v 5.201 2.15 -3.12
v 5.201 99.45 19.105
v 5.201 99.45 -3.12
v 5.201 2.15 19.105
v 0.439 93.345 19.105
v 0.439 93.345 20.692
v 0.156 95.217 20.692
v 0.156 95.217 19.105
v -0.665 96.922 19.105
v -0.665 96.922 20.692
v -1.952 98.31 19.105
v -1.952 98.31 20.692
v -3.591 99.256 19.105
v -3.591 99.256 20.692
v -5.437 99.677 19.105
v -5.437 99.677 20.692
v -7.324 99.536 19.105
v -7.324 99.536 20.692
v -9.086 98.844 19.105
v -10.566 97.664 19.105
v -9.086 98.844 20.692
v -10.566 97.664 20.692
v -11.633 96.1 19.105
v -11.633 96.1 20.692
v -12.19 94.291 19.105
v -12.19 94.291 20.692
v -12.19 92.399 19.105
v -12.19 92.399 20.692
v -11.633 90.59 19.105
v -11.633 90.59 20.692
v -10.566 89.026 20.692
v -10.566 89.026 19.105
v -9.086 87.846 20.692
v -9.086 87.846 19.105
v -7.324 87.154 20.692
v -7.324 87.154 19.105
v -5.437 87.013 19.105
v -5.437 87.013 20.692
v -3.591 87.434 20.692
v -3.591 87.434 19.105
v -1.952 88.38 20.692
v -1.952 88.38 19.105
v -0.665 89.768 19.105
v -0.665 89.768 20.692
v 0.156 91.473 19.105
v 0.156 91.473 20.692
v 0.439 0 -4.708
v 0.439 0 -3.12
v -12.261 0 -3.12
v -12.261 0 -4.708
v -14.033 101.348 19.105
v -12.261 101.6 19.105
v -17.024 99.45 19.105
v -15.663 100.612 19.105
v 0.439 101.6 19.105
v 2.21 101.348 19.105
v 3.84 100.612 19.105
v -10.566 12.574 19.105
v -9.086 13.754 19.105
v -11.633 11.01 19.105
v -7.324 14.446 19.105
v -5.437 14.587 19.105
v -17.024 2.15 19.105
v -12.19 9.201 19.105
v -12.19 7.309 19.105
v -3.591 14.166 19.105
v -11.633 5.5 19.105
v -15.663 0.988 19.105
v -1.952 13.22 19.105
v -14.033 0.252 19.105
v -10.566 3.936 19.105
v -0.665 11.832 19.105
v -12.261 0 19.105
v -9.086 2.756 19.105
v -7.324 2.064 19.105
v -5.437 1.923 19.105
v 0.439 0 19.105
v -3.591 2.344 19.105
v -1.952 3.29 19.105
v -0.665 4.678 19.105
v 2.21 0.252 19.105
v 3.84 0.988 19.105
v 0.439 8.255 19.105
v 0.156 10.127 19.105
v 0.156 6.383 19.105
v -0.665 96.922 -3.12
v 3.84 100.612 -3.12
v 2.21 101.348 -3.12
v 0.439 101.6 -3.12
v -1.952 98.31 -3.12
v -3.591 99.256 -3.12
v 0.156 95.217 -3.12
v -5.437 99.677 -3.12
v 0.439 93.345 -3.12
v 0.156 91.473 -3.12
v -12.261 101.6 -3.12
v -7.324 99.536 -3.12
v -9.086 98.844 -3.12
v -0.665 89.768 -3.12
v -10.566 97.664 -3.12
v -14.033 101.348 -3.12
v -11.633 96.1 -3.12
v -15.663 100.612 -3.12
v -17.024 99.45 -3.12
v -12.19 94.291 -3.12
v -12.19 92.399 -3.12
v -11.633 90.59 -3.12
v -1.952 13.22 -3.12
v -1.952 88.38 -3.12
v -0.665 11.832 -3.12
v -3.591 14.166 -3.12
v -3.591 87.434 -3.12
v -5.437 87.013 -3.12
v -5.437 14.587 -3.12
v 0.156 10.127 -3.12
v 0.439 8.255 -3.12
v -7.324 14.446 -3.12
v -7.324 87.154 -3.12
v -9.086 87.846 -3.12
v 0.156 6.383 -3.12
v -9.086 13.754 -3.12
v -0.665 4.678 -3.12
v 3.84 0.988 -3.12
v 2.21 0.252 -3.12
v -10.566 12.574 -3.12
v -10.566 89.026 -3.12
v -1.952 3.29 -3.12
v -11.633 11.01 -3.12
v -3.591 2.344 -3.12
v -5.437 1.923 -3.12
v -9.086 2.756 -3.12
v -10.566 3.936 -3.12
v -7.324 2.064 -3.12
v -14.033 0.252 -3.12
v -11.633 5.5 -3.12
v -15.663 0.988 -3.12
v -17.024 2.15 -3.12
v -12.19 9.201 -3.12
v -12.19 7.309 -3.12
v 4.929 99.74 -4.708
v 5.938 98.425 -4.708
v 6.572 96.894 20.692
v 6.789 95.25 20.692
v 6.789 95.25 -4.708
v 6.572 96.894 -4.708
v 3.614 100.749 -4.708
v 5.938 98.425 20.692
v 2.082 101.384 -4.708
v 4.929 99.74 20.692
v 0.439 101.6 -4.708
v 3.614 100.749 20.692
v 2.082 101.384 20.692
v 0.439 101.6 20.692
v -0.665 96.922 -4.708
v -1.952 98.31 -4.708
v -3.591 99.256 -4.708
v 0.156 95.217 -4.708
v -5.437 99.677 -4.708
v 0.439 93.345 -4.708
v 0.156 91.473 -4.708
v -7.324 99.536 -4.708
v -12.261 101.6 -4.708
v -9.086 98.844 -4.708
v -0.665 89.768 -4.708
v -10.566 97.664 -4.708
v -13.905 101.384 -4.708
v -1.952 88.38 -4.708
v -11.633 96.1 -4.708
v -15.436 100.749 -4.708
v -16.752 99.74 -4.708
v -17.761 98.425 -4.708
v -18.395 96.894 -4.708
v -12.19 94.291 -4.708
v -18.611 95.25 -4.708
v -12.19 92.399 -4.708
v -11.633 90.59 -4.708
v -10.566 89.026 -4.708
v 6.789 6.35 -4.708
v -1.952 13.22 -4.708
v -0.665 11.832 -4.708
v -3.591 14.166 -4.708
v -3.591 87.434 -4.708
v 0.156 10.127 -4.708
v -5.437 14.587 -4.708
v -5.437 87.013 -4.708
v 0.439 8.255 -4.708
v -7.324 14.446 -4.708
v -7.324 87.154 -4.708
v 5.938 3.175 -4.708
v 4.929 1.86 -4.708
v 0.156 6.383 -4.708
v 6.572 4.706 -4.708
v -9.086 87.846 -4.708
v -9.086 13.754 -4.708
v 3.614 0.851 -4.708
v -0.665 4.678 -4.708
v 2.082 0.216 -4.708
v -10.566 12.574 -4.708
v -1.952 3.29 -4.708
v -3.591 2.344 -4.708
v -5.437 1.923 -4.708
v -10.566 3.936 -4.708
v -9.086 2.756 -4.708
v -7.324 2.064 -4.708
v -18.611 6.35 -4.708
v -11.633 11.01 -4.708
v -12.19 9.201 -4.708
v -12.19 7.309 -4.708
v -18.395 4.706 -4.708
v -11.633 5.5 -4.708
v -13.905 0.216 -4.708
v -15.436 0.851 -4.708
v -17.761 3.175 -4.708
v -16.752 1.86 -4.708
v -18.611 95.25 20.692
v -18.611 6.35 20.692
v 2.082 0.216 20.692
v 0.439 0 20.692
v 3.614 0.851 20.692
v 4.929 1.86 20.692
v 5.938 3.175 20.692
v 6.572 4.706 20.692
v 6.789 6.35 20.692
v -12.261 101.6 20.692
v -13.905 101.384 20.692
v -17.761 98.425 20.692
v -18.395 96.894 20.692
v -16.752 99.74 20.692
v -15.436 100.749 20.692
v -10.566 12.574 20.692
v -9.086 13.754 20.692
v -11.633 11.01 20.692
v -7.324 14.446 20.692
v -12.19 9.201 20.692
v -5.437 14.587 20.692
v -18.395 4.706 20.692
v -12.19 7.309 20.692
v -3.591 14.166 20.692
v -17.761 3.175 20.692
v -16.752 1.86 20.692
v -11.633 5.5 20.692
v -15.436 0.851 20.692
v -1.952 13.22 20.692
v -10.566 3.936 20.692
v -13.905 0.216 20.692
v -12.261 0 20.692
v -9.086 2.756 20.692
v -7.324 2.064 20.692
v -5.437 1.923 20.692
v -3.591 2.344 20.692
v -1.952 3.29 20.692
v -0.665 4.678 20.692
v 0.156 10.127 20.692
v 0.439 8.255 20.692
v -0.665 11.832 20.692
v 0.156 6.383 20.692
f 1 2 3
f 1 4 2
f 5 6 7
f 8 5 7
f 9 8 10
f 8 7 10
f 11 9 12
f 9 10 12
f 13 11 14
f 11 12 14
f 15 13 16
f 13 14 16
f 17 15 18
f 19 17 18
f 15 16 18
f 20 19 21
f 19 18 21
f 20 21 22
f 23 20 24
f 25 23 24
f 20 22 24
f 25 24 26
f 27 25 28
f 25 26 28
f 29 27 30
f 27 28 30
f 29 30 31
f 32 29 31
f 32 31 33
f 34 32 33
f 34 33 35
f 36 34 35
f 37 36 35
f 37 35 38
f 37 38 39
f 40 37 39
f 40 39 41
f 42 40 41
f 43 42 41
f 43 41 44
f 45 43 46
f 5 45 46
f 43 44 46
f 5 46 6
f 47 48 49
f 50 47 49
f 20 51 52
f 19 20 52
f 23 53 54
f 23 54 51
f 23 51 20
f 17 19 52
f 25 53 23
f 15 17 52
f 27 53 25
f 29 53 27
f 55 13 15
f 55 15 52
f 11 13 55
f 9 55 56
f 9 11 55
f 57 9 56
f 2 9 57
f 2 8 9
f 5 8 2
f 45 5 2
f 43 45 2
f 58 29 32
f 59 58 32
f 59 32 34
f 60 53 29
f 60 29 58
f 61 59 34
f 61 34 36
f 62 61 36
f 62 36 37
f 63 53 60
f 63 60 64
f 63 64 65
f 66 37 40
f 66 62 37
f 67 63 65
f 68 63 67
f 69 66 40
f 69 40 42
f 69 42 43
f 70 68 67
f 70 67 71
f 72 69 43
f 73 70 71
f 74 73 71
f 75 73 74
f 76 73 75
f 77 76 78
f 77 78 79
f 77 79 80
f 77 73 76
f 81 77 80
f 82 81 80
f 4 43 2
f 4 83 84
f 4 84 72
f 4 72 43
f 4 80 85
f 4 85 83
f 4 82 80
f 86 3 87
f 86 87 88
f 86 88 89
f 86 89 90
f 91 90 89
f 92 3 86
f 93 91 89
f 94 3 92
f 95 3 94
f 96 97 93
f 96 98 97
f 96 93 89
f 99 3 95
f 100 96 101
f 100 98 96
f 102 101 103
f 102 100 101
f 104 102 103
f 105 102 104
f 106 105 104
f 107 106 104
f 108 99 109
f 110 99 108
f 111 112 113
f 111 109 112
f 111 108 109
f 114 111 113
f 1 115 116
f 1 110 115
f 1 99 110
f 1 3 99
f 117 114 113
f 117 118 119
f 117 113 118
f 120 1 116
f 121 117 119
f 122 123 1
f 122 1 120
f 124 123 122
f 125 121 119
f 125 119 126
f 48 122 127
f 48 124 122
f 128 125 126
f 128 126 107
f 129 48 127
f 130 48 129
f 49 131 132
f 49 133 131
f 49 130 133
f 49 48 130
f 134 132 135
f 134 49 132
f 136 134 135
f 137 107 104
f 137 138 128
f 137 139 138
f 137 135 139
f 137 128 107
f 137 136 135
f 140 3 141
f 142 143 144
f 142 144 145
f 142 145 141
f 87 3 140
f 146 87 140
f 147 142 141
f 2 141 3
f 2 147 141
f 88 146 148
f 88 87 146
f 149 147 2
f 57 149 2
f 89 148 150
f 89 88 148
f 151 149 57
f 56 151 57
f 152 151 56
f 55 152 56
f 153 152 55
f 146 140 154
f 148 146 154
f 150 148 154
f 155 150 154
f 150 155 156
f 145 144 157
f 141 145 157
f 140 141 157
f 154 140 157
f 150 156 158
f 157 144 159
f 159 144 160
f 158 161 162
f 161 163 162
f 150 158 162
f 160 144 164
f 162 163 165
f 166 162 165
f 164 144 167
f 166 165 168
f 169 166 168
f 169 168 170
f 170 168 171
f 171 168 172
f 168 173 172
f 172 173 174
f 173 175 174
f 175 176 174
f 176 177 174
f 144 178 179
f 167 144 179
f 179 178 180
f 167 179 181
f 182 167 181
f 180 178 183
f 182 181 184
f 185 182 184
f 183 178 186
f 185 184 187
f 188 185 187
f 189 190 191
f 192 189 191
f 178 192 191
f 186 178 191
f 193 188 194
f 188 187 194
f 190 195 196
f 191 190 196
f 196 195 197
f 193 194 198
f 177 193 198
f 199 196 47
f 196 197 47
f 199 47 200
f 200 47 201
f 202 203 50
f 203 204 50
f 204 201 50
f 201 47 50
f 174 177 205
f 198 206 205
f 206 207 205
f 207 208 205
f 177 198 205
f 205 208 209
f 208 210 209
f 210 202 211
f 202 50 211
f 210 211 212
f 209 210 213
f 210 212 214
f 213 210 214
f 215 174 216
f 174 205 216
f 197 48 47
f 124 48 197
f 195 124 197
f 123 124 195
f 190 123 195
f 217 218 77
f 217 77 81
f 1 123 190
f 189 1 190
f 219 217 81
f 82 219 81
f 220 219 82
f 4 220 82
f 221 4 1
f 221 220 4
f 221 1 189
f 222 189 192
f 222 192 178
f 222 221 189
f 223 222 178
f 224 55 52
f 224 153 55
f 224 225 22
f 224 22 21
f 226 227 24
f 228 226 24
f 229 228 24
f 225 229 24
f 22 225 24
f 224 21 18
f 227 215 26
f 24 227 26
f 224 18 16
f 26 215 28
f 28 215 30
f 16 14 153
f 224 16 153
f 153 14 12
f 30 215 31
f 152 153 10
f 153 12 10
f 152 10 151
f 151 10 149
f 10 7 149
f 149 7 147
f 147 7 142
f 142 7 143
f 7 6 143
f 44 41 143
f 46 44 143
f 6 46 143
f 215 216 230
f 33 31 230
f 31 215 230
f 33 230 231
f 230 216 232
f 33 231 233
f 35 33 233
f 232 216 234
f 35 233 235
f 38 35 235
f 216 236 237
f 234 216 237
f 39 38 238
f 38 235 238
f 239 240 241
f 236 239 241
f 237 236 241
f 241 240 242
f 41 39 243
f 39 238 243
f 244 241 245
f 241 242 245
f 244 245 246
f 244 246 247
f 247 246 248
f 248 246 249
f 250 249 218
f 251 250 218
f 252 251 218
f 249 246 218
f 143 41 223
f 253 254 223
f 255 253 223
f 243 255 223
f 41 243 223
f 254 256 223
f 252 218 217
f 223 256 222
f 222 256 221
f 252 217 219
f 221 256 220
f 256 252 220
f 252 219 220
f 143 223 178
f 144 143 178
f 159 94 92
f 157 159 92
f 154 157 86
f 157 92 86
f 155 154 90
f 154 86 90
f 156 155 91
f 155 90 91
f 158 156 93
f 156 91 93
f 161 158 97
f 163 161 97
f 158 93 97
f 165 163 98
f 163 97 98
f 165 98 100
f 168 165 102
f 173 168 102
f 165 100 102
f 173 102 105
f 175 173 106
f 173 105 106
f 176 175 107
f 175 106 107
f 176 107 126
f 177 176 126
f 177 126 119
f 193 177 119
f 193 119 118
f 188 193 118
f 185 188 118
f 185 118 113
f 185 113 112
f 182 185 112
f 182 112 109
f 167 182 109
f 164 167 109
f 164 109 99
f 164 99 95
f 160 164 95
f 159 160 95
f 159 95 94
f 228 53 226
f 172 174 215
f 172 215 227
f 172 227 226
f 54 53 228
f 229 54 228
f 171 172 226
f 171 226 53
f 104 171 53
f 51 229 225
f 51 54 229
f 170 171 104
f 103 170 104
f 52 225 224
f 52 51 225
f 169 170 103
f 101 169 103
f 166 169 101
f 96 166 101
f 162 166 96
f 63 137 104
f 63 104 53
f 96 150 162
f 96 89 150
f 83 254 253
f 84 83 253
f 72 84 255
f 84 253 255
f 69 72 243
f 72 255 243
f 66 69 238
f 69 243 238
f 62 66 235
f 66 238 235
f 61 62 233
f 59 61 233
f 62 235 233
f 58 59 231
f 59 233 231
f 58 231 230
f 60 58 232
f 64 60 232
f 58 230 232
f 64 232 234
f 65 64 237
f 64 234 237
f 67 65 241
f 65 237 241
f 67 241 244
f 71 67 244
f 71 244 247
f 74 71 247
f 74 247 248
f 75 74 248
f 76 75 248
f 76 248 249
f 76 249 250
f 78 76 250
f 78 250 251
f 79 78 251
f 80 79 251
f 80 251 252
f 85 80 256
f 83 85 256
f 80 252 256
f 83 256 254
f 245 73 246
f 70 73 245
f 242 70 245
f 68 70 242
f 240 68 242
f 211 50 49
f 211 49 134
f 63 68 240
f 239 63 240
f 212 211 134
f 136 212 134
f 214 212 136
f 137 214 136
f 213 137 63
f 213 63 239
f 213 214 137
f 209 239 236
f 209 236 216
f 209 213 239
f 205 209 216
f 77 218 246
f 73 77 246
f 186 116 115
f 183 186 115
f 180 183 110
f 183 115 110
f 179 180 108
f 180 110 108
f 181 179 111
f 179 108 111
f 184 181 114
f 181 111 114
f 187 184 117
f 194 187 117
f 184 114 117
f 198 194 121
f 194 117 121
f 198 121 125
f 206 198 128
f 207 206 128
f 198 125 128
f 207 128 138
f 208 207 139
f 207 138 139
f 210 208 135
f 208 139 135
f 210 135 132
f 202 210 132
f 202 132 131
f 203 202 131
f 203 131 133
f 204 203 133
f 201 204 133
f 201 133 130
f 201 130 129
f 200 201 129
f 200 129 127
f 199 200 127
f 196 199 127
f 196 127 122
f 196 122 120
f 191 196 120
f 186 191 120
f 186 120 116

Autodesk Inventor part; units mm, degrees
ref_plane "YZ Plane" through (0, 0, 0) normal (1, 0, 0) x (0, 1, 0)
ref_plane "XZ Plane" through (0, 0, 0) normal (0, 1, 0) x (-1, 0, 0)
ref_plane "XY Plane" through (0, 0, 0) normal (0, 0, 1) x (1, 0, 0)
sketch "Sketch1" plane through (0, 0, 0) normal (0, 1, 0) x (-1, 0, 0)
  line L0 (-6.7886, -4.7076) -> (18.6114, -4.7076)
  line L1 (18.6114, -4.7076) -> (18.6114, 20.6924)
  line L2 (18.6114, 20.6924) -> (-6.7886, 20.6924)
  line L3 (-6.7886, 20.6924) -> (-6.7886, -4.7076)
  line L4 (-5.2011, -3.1201) -> (17.0239, -3.1201)
  line L5 (17.0239, -3.1201) -> (17.0239, 19.1049)
  line L6 (17.0239, 19.1049) -> (-5.2011, 19.1049)
  line L7 (-5.2011, 19.1049) -> (-5.2011, -3.1201)
  point P0 (0, 0)
  dimension "d0" = 25.4
  dimension "d1" = 25.4
  dimension "d2" = 1.5875
  dimension "d3" = 1.5875
  dimension "d4" = 1.5875
  dimension "d5" = 1.5875
extrude "Extrusion1" add sketch "Sketch1" along normal blind 101.6
sketch "Sketch2" plane through (-18.6114, 0, 20.6924) normal (0, 0, 1) x (1, 0, 0)
  circle A0 centre (12.7, 8.255) radius 6.35
  circle A1 centre (12.7, 93.345) radius 6.35
  point P0 (25.4, 0)
  point P1 (25.4, 101.6)
  point P2 (18.6114, 0)
  dimension "d8" = 12.7
  dimension "d9" = 12.7
  dimension "d10" = 8.255
  dimension "d11" = 8.255
extrude "Extrusion2" cut sketch "Sketch2" against normal blind 101.6
fillet "Fillet1" radius 6.35 1 edges at (6.7886, 101.6, 7.9924)
fillet "Fillet2" radius 6.35 3 edges at (-18.6114, 101.6, 7.9924) (6.7886, 0, 7.9924) (-18.6114, 0, 7.9924)
equation "\"d3\" = d2"
equation "\"d4\" = d2"
equation "\"d5\" = d2"
equation "\"d11\" = d10"
properties part number "4inLink"
